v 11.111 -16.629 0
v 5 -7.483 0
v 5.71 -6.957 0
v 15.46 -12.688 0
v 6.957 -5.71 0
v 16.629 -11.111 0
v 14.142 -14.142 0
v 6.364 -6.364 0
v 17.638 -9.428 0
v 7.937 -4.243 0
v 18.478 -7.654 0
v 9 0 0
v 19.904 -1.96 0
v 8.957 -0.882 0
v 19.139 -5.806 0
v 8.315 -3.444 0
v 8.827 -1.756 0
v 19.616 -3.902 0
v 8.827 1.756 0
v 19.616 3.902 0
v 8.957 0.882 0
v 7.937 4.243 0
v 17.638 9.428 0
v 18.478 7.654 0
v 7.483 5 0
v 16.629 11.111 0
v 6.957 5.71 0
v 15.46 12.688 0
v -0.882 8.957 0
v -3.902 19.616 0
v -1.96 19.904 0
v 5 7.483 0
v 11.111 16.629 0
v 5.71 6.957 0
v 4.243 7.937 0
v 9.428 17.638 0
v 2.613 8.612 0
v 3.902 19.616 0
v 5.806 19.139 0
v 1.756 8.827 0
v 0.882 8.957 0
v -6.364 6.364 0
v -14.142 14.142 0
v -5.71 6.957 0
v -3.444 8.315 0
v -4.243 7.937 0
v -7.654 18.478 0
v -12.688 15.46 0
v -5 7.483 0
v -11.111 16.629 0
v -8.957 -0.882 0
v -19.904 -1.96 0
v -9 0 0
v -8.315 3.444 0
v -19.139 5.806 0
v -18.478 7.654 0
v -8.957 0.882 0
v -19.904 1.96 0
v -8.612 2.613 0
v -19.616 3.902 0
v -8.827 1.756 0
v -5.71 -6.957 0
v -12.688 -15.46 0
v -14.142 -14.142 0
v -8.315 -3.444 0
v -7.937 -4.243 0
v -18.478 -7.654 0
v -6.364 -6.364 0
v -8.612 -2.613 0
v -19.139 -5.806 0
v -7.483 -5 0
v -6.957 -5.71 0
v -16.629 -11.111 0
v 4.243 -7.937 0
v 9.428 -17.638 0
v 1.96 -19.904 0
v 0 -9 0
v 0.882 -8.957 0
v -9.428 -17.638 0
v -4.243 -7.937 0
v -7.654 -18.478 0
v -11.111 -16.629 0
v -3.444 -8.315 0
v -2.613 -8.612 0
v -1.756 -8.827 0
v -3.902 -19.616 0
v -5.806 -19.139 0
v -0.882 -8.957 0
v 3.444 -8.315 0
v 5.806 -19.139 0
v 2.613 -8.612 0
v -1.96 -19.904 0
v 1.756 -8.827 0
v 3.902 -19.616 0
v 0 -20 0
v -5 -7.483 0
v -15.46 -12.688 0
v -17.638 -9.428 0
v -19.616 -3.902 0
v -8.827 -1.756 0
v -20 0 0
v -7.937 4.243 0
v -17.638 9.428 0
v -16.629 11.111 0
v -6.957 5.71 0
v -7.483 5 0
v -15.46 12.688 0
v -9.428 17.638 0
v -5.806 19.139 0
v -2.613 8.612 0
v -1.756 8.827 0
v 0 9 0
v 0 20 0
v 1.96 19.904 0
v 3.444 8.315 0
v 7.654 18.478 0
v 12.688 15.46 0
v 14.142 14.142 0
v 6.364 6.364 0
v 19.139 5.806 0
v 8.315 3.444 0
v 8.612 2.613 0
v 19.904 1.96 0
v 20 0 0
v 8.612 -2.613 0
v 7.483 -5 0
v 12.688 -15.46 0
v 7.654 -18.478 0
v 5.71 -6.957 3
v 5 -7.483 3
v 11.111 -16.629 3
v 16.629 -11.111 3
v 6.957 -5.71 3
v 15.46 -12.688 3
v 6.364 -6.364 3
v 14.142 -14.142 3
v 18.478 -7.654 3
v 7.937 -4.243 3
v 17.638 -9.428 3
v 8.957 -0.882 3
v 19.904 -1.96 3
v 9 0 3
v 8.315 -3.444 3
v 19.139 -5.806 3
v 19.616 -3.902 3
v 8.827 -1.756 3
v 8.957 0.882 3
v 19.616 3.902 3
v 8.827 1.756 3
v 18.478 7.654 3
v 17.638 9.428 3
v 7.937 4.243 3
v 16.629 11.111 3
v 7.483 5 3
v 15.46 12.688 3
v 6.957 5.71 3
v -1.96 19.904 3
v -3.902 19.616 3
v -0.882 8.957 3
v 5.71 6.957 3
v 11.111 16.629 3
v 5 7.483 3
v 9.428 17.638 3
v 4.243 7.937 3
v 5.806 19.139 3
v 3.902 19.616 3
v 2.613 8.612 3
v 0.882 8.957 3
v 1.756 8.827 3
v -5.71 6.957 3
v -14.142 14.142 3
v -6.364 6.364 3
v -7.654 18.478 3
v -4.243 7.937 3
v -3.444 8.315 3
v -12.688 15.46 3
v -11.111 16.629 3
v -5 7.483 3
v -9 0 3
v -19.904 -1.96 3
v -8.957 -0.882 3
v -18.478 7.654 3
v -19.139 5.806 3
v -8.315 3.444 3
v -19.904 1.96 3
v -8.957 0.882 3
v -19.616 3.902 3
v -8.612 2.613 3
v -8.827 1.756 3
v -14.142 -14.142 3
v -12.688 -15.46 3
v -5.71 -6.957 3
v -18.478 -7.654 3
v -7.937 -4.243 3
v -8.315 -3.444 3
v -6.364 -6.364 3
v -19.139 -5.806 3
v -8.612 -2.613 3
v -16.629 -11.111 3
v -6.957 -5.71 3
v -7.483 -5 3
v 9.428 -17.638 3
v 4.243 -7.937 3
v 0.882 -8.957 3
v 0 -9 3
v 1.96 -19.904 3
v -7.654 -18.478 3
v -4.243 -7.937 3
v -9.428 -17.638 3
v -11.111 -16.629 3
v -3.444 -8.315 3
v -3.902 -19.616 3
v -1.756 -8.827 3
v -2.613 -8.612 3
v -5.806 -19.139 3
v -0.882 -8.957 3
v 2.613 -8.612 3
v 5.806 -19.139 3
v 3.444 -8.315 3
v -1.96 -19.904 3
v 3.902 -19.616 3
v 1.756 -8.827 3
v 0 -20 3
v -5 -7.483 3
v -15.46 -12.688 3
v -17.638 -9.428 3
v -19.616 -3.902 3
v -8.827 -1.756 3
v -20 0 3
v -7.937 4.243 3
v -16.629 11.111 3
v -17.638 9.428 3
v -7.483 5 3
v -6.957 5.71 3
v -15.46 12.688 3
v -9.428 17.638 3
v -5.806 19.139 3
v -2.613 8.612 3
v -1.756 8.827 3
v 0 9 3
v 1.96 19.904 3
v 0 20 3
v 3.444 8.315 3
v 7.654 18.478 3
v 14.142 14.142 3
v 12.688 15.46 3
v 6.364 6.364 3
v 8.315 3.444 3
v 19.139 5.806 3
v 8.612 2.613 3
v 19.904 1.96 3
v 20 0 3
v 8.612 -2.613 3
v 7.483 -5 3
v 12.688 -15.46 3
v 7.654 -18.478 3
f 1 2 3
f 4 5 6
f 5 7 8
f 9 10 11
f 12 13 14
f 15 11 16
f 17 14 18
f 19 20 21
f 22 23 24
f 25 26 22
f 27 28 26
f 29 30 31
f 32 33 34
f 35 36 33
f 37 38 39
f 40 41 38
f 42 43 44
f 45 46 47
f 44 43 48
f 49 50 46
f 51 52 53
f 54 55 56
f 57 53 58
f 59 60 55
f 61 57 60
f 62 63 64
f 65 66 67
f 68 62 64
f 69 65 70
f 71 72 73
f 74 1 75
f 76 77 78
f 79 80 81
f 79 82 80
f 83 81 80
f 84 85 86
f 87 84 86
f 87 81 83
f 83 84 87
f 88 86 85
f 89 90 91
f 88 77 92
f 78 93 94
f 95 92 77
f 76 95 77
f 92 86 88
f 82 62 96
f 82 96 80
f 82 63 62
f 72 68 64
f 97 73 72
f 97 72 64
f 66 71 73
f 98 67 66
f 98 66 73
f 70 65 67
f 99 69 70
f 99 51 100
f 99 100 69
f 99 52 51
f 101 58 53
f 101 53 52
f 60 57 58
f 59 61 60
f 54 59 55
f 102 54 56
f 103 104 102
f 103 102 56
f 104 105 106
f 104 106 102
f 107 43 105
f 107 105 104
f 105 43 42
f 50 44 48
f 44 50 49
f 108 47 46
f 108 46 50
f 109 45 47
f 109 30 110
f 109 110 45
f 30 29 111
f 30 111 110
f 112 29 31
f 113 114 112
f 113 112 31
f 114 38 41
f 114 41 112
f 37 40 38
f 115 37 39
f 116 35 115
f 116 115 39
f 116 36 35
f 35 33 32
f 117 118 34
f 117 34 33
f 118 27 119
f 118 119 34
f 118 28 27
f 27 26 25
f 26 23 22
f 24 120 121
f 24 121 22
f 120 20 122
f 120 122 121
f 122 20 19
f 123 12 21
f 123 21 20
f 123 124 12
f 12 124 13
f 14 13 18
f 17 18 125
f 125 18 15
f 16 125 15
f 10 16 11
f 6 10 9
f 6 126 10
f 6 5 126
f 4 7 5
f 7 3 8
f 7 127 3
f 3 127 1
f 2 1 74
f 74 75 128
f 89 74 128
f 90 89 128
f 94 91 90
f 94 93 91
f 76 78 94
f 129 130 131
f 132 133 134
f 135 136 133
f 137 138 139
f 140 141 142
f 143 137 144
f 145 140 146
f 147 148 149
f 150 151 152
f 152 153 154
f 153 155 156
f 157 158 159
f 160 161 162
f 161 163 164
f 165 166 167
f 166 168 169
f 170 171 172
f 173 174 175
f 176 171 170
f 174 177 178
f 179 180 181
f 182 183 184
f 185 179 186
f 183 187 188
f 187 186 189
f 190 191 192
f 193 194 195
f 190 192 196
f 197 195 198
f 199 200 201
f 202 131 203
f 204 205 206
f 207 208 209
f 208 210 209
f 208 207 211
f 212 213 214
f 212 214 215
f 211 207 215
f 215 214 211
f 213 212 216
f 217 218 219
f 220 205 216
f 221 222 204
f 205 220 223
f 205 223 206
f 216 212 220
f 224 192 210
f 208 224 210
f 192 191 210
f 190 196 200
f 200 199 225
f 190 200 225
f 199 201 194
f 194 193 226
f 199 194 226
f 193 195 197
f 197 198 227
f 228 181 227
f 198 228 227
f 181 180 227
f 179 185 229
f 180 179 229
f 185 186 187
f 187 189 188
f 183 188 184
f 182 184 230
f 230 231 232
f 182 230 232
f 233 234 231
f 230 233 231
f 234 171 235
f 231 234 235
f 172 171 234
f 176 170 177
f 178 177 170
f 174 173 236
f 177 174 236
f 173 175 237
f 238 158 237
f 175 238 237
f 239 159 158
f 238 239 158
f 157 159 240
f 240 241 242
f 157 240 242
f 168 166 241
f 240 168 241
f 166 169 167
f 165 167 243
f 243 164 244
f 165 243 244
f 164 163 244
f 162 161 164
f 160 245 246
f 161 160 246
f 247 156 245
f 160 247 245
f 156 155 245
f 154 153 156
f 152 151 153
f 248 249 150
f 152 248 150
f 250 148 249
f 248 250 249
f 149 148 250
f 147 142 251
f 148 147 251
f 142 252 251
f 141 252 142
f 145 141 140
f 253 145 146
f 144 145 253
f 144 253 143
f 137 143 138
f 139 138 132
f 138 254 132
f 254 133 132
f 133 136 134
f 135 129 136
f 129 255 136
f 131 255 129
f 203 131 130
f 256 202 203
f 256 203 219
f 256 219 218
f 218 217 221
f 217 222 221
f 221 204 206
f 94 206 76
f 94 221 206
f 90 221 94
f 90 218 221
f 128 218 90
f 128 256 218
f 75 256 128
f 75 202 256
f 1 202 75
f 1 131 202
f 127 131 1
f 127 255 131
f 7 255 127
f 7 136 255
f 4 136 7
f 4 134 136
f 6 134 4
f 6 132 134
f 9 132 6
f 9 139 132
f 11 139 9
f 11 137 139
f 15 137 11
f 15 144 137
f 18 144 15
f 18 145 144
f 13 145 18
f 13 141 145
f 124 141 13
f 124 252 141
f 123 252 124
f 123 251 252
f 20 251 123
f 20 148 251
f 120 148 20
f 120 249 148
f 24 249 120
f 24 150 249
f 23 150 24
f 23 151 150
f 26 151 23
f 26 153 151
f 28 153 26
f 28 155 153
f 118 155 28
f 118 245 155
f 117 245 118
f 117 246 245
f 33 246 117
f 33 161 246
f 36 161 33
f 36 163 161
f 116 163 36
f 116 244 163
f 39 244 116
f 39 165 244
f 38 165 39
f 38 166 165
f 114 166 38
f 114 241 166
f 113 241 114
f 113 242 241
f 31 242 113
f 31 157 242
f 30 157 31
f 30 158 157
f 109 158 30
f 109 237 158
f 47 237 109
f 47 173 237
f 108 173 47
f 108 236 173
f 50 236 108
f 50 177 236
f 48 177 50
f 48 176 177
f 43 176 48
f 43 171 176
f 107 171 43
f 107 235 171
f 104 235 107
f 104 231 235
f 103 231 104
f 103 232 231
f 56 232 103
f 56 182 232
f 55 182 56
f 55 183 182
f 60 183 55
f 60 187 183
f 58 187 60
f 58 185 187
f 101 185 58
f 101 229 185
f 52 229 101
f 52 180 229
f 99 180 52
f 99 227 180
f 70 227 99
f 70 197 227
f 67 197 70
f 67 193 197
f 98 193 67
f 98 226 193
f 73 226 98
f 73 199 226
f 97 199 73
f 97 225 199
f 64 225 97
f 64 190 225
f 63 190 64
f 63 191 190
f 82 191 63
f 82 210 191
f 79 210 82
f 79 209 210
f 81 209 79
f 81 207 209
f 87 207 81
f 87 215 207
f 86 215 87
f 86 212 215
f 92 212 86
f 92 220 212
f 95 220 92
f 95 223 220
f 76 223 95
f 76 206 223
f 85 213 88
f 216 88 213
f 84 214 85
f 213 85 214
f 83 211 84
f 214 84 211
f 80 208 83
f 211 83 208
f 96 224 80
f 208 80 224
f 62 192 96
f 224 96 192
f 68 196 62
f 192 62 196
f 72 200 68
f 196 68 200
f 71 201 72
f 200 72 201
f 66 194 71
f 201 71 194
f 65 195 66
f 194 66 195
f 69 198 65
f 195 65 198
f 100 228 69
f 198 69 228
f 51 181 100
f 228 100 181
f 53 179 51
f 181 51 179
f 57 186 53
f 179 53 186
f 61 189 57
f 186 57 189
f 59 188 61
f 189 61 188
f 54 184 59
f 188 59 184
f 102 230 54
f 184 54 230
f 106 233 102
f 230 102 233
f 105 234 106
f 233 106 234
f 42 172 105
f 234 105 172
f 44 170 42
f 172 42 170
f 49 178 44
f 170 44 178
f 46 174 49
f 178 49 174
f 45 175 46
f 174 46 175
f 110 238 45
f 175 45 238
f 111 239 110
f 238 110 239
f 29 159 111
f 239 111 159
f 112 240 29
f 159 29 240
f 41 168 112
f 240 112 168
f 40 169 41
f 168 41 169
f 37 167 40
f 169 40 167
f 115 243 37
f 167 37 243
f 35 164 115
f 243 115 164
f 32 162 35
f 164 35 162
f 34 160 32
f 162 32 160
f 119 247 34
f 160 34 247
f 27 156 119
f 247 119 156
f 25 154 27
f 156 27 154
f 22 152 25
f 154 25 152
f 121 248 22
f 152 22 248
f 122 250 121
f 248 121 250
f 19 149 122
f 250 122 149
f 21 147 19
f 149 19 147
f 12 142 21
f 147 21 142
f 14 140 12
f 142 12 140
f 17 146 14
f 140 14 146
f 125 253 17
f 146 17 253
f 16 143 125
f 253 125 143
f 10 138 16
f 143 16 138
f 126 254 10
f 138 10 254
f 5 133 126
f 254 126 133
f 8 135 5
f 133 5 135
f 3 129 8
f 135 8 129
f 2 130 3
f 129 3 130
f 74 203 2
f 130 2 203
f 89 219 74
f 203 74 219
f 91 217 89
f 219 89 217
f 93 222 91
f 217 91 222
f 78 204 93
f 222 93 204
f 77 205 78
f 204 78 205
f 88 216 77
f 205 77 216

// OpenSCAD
linear_extrude(height = 3)
  difference() {
    circle(r = 20, $fn = 64);
    circle(r = 9, $fn = 64);
  }
